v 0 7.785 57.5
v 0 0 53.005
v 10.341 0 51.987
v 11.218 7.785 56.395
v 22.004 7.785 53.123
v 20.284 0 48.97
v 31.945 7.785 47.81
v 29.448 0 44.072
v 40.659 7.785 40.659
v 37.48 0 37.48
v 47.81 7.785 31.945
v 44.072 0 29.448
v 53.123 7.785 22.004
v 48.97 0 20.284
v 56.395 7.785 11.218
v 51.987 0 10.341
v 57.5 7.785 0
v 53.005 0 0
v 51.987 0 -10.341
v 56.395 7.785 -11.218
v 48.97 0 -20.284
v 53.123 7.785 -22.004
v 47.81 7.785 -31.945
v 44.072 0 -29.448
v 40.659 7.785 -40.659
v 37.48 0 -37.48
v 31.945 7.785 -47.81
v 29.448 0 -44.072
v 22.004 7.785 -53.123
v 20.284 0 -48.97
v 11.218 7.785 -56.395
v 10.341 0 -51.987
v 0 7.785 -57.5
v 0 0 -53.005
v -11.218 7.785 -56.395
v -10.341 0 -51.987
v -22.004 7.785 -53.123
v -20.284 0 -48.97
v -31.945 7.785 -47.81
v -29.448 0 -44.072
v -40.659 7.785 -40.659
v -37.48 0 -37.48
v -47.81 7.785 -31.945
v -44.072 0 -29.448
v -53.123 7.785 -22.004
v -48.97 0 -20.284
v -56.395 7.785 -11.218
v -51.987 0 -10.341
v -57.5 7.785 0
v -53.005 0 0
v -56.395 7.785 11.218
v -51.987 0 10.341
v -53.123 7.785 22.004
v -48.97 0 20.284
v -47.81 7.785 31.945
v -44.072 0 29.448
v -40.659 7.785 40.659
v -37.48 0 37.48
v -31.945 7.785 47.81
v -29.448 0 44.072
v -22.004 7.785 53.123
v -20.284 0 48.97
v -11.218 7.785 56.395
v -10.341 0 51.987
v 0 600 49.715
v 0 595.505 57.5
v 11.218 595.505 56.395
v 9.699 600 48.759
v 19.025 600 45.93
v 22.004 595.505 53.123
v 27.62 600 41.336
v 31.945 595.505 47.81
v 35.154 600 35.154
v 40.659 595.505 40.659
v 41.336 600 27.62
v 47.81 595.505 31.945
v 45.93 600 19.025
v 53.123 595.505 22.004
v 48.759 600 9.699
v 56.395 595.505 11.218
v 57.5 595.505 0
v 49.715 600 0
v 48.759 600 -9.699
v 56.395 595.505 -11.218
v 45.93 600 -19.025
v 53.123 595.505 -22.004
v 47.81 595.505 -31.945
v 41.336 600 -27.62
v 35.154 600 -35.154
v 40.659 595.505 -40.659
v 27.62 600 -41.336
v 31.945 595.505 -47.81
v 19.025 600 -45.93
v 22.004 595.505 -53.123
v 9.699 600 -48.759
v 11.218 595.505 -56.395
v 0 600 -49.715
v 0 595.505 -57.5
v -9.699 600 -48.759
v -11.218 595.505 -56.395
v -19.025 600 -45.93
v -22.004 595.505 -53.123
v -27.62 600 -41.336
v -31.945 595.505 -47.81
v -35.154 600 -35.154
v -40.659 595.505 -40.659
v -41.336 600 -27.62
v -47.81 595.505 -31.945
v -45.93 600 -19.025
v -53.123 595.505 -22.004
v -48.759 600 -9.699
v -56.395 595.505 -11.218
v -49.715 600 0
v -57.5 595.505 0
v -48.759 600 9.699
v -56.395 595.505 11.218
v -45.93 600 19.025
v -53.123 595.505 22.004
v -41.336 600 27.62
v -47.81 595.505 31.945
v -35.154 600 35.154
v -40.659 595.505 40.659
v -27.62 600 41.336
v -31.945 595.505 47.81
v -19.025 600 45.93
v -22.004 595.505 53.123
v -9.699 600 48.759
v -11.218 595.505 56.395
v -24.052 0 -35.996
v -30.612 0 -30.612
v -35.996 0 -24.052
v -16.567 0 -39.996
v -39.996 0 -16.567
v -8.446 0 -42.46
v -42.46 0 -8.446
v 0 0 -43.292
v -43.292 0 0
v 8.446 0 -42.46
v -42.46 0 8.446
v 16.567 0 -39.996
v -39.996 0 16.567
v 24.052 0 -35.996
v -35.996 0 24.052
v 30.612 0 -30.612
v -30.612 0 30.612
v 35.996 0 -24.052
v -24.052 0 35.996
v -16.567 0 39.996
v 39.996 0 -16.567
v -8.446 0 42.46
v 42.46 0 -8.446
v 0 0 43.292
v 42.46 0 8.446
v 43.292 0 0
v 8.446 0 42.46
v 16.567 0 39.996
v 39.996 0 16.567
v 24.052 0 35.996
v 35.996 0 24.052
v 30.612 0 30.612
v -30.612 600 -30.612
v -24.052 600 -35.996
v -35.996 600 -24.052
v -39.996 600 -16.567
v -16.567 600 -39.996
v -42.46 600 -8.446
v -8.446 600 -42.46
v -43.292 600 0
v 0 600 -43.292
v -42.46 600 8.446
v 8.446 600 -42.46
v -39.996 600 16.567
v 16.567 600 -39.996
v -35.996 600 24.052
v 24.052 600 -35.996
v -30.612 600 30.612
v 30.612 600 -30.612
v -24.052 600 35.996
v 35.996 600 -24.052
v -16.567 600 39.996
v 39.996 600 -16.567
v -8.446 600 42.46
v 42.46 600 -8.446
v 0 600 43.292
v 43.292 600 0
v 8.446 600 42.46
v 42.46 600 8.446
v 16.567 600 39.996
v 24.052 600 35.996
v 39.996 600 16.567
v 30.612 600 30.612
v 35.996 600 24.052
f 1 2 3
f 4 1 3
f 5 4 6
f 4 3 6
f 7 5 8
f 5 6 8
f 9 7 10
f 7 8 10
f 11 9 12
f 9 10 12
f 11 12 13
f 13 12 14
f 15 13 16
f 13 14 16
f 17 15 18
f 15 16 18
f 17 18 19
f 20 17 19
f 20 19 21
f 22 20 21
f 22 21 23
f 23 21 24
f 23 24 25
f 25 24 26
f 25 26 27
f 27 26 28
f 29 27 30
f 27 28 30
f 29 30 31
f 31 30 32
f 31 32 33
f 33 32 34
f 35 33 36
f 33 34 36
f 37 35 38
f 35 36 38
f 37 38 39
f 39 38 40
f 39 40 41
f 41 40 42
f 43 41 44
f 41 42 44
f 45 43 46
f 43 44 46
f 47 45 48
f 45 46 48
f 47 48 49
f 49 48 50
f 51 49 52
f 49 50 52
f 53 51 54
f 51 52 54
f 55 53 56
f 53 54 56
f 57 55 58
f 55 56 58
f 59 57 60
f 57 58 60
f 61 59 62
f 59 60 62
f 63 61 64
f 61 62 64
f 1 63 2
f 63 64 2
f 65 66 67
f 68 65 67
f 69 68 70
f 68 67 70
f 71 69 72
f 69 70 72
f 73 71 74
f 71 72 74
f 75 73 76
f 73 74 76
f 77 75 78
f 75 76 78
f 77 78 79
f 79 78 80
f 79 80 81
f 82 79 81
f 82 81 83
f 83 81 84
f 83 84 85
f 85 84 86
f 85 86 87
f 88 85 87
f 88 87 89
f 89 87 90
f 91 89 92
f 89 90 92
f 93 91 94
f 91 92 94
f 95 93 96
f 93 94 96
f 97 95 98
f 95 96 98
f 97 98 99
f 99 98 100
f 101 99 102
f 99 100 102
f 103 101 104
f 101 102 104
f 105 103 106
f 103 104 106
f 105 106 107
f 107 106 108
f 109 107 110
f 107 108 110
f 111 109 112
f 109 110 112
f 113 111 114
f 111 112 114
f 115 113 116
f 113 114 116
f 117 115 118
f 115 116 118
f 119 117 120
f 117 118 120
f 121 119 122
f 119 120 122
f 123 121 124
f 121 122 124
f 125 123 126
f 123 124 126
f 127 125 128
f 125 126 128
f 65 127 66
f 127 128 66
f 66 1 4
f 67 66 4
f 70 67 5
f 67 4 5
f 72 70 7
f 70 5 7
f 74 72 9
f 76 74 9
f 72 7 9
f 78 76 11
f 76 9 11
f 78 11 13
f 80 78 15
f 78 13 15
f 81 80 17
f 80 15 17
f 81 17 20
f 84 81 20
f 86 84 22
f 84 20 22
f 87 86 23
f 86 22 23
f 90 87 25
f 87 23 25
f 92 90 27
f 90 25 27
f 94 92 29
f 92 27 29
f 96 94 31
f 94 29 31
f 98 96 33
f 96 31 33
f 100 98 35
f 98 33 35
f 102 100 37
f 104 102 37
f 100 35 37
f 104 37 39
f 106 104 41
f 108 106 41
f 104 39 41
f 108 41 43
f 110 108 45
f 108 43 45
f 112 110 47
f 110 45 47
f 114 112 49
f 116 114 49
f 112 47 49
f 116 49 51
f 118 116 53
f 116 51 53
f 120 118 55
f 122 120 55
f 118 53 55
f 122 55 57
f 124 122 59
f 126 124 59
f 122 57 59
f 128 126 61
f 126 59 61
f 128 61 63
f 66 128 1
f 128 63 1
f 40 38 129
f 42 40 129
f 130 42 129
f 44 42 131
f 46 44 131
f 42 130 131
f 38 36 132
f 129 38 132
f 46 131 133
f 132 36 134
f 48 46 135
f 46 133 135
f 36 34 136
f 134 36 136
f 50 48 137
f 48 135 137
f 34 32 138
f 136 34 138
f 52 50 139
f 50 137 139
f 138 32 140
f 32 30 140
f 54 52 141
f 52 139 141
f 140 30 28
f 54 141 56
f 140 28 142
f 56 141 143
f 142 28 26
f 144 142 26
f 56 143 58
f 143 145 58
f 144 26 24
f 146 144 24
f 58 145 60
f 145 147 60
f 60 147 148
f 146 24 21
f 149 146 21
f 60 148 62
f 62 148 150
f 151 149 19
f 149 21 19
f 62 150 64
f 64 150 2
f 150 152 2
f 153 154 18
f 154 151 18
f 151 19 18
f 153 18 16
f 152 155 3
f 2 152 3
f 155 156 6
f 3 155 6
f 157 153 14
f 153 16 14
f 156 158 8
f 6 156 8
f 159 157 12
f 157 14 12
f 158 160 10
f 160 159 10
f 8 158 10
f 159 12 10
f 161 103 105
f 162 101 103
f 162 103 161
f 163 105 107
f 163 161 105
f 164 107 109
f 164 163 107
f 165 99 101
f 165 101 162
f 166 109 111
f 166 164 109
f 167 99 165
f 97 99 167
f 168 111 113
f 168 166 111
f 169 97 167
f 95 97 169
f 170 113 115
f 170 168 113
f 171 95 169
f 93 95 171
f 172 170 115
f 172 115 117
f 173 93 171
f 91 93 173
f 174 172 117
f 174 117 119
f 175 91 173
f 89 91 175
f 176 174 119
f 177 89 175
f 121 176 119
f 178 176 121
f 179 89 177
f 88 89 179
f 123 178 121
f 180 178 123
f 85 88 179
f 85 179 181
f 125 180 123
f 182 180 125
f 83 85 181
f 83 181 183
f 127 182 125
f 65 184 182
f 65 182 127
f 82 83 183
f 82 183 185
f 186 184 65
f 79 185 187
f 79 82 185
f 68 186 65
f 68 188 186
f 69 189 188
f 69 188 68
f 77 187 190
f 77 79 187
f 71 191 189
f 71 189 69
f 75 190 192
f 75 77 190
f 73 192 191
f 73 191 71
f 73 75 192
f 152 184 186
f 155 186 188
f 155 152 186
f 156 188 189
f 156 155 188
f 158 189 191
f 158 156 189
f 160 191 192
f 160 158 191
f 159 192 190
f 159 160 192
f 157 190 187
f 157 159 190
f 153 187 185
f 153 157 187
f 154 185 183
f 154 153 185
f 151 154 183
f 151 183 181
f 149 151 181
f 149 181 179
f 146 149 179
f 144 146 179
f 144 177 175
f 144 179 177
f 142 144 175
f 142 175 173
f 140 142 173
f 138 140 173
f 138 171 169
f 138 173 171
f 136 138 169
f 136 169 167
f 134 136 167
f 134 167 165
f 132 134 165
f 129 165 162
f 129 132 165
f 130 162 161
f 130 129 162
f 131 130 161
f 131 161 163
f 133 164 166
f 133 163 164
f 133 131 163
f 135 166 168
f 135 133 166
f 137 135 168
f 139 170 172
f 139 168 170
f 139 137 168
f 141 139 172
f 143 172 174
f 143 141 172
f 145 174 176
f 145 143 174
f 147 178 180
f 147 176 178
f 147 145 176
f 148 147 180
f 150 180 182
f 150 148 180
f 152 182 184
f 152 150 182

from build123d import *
from OCP.BRepFilletAPI import BRepFilletAPI_MakeChamfer

# Parameters (mm, degrees)
SKETCH1_R           = 57.5
BOSS_EXTRUDE1_DEPTH = 600
SKETCH2_R           = 43.291669187
CUT_EXTRUDE1_DEPTH  = 606.485342515
CHAMFER1_SIZE       = 4.494839011
CHAMFER1_SIZE2      = 7.785289539


with BuildPart() as part:
    # Sketch1 → Boss-Extrude1 (new body)
    with BuildSketch(Plane(origin=(0, 0, 0), x_dir=(1, 0, 0), z_dir=(0, 1, 0))):
        Circle(SKETCH1_R)
    extrude(amount=BOSS_EXTRUDE1_DEPTH)

    # Sketch2 → Cut-Extrude1 (cut, through all)
    with BuildSketch(Plane(origin=(0, 0, 0), x_dir=(1, 0, 0), z_dir=(0, 1, 0))):
        Circle(SKETCH2_R)
    extrude(amount=CUT_EXTRUDE1_DEPTH, mode=Mode.SUBTRACT)

    # Chamfer1: one chamfer whose edges measure the first distance from different faces: ONE call of the kernel's chamfer builder (chamfer() names one face for all edges)
    chamfer1_edges_1 = [part.edges().sort_by_distance(p)[0] for p in [
        (-57.5, 600, 0),
    ]]
    chamfer1_side_1 = [part.faces().sort_by_distance(p)[0] for p in [
        (-57.5, 300, 0),
    ]]
    chamfer1_edges_2 = [part.edges().sort_by_distance(p)[0] for p in [
        (-57.5, 0, 0),
    ]]
    chamfer1_side_2 = [part.faces().sort_by_distance(p)[0] for p in [
        (-55.873654403, 0, 0),
    ]]
    chamfer1 = BRepFilletAPI_MakeChamfer(part.part.solid().wrapped)
    for e in chamfer1_edges_1:
        chamfer1.Add(CHAMFER1_SIZE, CHAMFER1_SIZE2, e.wrapped, chamfer1_side_1[0].wrapped)  # the first distance lies on this face
    for e in chamfer1_edges_2:
        chamfer1.Add(CHAMFER1_SIZE, CHAMFER1_SIZE2, e.wrapped, chamfer1_side_2[0].wrapped)  # the first distance lies on this face
    add(Compound.cast(chamfer1.Shape()), mode=Mode.REPLACE)


solid = part.part
